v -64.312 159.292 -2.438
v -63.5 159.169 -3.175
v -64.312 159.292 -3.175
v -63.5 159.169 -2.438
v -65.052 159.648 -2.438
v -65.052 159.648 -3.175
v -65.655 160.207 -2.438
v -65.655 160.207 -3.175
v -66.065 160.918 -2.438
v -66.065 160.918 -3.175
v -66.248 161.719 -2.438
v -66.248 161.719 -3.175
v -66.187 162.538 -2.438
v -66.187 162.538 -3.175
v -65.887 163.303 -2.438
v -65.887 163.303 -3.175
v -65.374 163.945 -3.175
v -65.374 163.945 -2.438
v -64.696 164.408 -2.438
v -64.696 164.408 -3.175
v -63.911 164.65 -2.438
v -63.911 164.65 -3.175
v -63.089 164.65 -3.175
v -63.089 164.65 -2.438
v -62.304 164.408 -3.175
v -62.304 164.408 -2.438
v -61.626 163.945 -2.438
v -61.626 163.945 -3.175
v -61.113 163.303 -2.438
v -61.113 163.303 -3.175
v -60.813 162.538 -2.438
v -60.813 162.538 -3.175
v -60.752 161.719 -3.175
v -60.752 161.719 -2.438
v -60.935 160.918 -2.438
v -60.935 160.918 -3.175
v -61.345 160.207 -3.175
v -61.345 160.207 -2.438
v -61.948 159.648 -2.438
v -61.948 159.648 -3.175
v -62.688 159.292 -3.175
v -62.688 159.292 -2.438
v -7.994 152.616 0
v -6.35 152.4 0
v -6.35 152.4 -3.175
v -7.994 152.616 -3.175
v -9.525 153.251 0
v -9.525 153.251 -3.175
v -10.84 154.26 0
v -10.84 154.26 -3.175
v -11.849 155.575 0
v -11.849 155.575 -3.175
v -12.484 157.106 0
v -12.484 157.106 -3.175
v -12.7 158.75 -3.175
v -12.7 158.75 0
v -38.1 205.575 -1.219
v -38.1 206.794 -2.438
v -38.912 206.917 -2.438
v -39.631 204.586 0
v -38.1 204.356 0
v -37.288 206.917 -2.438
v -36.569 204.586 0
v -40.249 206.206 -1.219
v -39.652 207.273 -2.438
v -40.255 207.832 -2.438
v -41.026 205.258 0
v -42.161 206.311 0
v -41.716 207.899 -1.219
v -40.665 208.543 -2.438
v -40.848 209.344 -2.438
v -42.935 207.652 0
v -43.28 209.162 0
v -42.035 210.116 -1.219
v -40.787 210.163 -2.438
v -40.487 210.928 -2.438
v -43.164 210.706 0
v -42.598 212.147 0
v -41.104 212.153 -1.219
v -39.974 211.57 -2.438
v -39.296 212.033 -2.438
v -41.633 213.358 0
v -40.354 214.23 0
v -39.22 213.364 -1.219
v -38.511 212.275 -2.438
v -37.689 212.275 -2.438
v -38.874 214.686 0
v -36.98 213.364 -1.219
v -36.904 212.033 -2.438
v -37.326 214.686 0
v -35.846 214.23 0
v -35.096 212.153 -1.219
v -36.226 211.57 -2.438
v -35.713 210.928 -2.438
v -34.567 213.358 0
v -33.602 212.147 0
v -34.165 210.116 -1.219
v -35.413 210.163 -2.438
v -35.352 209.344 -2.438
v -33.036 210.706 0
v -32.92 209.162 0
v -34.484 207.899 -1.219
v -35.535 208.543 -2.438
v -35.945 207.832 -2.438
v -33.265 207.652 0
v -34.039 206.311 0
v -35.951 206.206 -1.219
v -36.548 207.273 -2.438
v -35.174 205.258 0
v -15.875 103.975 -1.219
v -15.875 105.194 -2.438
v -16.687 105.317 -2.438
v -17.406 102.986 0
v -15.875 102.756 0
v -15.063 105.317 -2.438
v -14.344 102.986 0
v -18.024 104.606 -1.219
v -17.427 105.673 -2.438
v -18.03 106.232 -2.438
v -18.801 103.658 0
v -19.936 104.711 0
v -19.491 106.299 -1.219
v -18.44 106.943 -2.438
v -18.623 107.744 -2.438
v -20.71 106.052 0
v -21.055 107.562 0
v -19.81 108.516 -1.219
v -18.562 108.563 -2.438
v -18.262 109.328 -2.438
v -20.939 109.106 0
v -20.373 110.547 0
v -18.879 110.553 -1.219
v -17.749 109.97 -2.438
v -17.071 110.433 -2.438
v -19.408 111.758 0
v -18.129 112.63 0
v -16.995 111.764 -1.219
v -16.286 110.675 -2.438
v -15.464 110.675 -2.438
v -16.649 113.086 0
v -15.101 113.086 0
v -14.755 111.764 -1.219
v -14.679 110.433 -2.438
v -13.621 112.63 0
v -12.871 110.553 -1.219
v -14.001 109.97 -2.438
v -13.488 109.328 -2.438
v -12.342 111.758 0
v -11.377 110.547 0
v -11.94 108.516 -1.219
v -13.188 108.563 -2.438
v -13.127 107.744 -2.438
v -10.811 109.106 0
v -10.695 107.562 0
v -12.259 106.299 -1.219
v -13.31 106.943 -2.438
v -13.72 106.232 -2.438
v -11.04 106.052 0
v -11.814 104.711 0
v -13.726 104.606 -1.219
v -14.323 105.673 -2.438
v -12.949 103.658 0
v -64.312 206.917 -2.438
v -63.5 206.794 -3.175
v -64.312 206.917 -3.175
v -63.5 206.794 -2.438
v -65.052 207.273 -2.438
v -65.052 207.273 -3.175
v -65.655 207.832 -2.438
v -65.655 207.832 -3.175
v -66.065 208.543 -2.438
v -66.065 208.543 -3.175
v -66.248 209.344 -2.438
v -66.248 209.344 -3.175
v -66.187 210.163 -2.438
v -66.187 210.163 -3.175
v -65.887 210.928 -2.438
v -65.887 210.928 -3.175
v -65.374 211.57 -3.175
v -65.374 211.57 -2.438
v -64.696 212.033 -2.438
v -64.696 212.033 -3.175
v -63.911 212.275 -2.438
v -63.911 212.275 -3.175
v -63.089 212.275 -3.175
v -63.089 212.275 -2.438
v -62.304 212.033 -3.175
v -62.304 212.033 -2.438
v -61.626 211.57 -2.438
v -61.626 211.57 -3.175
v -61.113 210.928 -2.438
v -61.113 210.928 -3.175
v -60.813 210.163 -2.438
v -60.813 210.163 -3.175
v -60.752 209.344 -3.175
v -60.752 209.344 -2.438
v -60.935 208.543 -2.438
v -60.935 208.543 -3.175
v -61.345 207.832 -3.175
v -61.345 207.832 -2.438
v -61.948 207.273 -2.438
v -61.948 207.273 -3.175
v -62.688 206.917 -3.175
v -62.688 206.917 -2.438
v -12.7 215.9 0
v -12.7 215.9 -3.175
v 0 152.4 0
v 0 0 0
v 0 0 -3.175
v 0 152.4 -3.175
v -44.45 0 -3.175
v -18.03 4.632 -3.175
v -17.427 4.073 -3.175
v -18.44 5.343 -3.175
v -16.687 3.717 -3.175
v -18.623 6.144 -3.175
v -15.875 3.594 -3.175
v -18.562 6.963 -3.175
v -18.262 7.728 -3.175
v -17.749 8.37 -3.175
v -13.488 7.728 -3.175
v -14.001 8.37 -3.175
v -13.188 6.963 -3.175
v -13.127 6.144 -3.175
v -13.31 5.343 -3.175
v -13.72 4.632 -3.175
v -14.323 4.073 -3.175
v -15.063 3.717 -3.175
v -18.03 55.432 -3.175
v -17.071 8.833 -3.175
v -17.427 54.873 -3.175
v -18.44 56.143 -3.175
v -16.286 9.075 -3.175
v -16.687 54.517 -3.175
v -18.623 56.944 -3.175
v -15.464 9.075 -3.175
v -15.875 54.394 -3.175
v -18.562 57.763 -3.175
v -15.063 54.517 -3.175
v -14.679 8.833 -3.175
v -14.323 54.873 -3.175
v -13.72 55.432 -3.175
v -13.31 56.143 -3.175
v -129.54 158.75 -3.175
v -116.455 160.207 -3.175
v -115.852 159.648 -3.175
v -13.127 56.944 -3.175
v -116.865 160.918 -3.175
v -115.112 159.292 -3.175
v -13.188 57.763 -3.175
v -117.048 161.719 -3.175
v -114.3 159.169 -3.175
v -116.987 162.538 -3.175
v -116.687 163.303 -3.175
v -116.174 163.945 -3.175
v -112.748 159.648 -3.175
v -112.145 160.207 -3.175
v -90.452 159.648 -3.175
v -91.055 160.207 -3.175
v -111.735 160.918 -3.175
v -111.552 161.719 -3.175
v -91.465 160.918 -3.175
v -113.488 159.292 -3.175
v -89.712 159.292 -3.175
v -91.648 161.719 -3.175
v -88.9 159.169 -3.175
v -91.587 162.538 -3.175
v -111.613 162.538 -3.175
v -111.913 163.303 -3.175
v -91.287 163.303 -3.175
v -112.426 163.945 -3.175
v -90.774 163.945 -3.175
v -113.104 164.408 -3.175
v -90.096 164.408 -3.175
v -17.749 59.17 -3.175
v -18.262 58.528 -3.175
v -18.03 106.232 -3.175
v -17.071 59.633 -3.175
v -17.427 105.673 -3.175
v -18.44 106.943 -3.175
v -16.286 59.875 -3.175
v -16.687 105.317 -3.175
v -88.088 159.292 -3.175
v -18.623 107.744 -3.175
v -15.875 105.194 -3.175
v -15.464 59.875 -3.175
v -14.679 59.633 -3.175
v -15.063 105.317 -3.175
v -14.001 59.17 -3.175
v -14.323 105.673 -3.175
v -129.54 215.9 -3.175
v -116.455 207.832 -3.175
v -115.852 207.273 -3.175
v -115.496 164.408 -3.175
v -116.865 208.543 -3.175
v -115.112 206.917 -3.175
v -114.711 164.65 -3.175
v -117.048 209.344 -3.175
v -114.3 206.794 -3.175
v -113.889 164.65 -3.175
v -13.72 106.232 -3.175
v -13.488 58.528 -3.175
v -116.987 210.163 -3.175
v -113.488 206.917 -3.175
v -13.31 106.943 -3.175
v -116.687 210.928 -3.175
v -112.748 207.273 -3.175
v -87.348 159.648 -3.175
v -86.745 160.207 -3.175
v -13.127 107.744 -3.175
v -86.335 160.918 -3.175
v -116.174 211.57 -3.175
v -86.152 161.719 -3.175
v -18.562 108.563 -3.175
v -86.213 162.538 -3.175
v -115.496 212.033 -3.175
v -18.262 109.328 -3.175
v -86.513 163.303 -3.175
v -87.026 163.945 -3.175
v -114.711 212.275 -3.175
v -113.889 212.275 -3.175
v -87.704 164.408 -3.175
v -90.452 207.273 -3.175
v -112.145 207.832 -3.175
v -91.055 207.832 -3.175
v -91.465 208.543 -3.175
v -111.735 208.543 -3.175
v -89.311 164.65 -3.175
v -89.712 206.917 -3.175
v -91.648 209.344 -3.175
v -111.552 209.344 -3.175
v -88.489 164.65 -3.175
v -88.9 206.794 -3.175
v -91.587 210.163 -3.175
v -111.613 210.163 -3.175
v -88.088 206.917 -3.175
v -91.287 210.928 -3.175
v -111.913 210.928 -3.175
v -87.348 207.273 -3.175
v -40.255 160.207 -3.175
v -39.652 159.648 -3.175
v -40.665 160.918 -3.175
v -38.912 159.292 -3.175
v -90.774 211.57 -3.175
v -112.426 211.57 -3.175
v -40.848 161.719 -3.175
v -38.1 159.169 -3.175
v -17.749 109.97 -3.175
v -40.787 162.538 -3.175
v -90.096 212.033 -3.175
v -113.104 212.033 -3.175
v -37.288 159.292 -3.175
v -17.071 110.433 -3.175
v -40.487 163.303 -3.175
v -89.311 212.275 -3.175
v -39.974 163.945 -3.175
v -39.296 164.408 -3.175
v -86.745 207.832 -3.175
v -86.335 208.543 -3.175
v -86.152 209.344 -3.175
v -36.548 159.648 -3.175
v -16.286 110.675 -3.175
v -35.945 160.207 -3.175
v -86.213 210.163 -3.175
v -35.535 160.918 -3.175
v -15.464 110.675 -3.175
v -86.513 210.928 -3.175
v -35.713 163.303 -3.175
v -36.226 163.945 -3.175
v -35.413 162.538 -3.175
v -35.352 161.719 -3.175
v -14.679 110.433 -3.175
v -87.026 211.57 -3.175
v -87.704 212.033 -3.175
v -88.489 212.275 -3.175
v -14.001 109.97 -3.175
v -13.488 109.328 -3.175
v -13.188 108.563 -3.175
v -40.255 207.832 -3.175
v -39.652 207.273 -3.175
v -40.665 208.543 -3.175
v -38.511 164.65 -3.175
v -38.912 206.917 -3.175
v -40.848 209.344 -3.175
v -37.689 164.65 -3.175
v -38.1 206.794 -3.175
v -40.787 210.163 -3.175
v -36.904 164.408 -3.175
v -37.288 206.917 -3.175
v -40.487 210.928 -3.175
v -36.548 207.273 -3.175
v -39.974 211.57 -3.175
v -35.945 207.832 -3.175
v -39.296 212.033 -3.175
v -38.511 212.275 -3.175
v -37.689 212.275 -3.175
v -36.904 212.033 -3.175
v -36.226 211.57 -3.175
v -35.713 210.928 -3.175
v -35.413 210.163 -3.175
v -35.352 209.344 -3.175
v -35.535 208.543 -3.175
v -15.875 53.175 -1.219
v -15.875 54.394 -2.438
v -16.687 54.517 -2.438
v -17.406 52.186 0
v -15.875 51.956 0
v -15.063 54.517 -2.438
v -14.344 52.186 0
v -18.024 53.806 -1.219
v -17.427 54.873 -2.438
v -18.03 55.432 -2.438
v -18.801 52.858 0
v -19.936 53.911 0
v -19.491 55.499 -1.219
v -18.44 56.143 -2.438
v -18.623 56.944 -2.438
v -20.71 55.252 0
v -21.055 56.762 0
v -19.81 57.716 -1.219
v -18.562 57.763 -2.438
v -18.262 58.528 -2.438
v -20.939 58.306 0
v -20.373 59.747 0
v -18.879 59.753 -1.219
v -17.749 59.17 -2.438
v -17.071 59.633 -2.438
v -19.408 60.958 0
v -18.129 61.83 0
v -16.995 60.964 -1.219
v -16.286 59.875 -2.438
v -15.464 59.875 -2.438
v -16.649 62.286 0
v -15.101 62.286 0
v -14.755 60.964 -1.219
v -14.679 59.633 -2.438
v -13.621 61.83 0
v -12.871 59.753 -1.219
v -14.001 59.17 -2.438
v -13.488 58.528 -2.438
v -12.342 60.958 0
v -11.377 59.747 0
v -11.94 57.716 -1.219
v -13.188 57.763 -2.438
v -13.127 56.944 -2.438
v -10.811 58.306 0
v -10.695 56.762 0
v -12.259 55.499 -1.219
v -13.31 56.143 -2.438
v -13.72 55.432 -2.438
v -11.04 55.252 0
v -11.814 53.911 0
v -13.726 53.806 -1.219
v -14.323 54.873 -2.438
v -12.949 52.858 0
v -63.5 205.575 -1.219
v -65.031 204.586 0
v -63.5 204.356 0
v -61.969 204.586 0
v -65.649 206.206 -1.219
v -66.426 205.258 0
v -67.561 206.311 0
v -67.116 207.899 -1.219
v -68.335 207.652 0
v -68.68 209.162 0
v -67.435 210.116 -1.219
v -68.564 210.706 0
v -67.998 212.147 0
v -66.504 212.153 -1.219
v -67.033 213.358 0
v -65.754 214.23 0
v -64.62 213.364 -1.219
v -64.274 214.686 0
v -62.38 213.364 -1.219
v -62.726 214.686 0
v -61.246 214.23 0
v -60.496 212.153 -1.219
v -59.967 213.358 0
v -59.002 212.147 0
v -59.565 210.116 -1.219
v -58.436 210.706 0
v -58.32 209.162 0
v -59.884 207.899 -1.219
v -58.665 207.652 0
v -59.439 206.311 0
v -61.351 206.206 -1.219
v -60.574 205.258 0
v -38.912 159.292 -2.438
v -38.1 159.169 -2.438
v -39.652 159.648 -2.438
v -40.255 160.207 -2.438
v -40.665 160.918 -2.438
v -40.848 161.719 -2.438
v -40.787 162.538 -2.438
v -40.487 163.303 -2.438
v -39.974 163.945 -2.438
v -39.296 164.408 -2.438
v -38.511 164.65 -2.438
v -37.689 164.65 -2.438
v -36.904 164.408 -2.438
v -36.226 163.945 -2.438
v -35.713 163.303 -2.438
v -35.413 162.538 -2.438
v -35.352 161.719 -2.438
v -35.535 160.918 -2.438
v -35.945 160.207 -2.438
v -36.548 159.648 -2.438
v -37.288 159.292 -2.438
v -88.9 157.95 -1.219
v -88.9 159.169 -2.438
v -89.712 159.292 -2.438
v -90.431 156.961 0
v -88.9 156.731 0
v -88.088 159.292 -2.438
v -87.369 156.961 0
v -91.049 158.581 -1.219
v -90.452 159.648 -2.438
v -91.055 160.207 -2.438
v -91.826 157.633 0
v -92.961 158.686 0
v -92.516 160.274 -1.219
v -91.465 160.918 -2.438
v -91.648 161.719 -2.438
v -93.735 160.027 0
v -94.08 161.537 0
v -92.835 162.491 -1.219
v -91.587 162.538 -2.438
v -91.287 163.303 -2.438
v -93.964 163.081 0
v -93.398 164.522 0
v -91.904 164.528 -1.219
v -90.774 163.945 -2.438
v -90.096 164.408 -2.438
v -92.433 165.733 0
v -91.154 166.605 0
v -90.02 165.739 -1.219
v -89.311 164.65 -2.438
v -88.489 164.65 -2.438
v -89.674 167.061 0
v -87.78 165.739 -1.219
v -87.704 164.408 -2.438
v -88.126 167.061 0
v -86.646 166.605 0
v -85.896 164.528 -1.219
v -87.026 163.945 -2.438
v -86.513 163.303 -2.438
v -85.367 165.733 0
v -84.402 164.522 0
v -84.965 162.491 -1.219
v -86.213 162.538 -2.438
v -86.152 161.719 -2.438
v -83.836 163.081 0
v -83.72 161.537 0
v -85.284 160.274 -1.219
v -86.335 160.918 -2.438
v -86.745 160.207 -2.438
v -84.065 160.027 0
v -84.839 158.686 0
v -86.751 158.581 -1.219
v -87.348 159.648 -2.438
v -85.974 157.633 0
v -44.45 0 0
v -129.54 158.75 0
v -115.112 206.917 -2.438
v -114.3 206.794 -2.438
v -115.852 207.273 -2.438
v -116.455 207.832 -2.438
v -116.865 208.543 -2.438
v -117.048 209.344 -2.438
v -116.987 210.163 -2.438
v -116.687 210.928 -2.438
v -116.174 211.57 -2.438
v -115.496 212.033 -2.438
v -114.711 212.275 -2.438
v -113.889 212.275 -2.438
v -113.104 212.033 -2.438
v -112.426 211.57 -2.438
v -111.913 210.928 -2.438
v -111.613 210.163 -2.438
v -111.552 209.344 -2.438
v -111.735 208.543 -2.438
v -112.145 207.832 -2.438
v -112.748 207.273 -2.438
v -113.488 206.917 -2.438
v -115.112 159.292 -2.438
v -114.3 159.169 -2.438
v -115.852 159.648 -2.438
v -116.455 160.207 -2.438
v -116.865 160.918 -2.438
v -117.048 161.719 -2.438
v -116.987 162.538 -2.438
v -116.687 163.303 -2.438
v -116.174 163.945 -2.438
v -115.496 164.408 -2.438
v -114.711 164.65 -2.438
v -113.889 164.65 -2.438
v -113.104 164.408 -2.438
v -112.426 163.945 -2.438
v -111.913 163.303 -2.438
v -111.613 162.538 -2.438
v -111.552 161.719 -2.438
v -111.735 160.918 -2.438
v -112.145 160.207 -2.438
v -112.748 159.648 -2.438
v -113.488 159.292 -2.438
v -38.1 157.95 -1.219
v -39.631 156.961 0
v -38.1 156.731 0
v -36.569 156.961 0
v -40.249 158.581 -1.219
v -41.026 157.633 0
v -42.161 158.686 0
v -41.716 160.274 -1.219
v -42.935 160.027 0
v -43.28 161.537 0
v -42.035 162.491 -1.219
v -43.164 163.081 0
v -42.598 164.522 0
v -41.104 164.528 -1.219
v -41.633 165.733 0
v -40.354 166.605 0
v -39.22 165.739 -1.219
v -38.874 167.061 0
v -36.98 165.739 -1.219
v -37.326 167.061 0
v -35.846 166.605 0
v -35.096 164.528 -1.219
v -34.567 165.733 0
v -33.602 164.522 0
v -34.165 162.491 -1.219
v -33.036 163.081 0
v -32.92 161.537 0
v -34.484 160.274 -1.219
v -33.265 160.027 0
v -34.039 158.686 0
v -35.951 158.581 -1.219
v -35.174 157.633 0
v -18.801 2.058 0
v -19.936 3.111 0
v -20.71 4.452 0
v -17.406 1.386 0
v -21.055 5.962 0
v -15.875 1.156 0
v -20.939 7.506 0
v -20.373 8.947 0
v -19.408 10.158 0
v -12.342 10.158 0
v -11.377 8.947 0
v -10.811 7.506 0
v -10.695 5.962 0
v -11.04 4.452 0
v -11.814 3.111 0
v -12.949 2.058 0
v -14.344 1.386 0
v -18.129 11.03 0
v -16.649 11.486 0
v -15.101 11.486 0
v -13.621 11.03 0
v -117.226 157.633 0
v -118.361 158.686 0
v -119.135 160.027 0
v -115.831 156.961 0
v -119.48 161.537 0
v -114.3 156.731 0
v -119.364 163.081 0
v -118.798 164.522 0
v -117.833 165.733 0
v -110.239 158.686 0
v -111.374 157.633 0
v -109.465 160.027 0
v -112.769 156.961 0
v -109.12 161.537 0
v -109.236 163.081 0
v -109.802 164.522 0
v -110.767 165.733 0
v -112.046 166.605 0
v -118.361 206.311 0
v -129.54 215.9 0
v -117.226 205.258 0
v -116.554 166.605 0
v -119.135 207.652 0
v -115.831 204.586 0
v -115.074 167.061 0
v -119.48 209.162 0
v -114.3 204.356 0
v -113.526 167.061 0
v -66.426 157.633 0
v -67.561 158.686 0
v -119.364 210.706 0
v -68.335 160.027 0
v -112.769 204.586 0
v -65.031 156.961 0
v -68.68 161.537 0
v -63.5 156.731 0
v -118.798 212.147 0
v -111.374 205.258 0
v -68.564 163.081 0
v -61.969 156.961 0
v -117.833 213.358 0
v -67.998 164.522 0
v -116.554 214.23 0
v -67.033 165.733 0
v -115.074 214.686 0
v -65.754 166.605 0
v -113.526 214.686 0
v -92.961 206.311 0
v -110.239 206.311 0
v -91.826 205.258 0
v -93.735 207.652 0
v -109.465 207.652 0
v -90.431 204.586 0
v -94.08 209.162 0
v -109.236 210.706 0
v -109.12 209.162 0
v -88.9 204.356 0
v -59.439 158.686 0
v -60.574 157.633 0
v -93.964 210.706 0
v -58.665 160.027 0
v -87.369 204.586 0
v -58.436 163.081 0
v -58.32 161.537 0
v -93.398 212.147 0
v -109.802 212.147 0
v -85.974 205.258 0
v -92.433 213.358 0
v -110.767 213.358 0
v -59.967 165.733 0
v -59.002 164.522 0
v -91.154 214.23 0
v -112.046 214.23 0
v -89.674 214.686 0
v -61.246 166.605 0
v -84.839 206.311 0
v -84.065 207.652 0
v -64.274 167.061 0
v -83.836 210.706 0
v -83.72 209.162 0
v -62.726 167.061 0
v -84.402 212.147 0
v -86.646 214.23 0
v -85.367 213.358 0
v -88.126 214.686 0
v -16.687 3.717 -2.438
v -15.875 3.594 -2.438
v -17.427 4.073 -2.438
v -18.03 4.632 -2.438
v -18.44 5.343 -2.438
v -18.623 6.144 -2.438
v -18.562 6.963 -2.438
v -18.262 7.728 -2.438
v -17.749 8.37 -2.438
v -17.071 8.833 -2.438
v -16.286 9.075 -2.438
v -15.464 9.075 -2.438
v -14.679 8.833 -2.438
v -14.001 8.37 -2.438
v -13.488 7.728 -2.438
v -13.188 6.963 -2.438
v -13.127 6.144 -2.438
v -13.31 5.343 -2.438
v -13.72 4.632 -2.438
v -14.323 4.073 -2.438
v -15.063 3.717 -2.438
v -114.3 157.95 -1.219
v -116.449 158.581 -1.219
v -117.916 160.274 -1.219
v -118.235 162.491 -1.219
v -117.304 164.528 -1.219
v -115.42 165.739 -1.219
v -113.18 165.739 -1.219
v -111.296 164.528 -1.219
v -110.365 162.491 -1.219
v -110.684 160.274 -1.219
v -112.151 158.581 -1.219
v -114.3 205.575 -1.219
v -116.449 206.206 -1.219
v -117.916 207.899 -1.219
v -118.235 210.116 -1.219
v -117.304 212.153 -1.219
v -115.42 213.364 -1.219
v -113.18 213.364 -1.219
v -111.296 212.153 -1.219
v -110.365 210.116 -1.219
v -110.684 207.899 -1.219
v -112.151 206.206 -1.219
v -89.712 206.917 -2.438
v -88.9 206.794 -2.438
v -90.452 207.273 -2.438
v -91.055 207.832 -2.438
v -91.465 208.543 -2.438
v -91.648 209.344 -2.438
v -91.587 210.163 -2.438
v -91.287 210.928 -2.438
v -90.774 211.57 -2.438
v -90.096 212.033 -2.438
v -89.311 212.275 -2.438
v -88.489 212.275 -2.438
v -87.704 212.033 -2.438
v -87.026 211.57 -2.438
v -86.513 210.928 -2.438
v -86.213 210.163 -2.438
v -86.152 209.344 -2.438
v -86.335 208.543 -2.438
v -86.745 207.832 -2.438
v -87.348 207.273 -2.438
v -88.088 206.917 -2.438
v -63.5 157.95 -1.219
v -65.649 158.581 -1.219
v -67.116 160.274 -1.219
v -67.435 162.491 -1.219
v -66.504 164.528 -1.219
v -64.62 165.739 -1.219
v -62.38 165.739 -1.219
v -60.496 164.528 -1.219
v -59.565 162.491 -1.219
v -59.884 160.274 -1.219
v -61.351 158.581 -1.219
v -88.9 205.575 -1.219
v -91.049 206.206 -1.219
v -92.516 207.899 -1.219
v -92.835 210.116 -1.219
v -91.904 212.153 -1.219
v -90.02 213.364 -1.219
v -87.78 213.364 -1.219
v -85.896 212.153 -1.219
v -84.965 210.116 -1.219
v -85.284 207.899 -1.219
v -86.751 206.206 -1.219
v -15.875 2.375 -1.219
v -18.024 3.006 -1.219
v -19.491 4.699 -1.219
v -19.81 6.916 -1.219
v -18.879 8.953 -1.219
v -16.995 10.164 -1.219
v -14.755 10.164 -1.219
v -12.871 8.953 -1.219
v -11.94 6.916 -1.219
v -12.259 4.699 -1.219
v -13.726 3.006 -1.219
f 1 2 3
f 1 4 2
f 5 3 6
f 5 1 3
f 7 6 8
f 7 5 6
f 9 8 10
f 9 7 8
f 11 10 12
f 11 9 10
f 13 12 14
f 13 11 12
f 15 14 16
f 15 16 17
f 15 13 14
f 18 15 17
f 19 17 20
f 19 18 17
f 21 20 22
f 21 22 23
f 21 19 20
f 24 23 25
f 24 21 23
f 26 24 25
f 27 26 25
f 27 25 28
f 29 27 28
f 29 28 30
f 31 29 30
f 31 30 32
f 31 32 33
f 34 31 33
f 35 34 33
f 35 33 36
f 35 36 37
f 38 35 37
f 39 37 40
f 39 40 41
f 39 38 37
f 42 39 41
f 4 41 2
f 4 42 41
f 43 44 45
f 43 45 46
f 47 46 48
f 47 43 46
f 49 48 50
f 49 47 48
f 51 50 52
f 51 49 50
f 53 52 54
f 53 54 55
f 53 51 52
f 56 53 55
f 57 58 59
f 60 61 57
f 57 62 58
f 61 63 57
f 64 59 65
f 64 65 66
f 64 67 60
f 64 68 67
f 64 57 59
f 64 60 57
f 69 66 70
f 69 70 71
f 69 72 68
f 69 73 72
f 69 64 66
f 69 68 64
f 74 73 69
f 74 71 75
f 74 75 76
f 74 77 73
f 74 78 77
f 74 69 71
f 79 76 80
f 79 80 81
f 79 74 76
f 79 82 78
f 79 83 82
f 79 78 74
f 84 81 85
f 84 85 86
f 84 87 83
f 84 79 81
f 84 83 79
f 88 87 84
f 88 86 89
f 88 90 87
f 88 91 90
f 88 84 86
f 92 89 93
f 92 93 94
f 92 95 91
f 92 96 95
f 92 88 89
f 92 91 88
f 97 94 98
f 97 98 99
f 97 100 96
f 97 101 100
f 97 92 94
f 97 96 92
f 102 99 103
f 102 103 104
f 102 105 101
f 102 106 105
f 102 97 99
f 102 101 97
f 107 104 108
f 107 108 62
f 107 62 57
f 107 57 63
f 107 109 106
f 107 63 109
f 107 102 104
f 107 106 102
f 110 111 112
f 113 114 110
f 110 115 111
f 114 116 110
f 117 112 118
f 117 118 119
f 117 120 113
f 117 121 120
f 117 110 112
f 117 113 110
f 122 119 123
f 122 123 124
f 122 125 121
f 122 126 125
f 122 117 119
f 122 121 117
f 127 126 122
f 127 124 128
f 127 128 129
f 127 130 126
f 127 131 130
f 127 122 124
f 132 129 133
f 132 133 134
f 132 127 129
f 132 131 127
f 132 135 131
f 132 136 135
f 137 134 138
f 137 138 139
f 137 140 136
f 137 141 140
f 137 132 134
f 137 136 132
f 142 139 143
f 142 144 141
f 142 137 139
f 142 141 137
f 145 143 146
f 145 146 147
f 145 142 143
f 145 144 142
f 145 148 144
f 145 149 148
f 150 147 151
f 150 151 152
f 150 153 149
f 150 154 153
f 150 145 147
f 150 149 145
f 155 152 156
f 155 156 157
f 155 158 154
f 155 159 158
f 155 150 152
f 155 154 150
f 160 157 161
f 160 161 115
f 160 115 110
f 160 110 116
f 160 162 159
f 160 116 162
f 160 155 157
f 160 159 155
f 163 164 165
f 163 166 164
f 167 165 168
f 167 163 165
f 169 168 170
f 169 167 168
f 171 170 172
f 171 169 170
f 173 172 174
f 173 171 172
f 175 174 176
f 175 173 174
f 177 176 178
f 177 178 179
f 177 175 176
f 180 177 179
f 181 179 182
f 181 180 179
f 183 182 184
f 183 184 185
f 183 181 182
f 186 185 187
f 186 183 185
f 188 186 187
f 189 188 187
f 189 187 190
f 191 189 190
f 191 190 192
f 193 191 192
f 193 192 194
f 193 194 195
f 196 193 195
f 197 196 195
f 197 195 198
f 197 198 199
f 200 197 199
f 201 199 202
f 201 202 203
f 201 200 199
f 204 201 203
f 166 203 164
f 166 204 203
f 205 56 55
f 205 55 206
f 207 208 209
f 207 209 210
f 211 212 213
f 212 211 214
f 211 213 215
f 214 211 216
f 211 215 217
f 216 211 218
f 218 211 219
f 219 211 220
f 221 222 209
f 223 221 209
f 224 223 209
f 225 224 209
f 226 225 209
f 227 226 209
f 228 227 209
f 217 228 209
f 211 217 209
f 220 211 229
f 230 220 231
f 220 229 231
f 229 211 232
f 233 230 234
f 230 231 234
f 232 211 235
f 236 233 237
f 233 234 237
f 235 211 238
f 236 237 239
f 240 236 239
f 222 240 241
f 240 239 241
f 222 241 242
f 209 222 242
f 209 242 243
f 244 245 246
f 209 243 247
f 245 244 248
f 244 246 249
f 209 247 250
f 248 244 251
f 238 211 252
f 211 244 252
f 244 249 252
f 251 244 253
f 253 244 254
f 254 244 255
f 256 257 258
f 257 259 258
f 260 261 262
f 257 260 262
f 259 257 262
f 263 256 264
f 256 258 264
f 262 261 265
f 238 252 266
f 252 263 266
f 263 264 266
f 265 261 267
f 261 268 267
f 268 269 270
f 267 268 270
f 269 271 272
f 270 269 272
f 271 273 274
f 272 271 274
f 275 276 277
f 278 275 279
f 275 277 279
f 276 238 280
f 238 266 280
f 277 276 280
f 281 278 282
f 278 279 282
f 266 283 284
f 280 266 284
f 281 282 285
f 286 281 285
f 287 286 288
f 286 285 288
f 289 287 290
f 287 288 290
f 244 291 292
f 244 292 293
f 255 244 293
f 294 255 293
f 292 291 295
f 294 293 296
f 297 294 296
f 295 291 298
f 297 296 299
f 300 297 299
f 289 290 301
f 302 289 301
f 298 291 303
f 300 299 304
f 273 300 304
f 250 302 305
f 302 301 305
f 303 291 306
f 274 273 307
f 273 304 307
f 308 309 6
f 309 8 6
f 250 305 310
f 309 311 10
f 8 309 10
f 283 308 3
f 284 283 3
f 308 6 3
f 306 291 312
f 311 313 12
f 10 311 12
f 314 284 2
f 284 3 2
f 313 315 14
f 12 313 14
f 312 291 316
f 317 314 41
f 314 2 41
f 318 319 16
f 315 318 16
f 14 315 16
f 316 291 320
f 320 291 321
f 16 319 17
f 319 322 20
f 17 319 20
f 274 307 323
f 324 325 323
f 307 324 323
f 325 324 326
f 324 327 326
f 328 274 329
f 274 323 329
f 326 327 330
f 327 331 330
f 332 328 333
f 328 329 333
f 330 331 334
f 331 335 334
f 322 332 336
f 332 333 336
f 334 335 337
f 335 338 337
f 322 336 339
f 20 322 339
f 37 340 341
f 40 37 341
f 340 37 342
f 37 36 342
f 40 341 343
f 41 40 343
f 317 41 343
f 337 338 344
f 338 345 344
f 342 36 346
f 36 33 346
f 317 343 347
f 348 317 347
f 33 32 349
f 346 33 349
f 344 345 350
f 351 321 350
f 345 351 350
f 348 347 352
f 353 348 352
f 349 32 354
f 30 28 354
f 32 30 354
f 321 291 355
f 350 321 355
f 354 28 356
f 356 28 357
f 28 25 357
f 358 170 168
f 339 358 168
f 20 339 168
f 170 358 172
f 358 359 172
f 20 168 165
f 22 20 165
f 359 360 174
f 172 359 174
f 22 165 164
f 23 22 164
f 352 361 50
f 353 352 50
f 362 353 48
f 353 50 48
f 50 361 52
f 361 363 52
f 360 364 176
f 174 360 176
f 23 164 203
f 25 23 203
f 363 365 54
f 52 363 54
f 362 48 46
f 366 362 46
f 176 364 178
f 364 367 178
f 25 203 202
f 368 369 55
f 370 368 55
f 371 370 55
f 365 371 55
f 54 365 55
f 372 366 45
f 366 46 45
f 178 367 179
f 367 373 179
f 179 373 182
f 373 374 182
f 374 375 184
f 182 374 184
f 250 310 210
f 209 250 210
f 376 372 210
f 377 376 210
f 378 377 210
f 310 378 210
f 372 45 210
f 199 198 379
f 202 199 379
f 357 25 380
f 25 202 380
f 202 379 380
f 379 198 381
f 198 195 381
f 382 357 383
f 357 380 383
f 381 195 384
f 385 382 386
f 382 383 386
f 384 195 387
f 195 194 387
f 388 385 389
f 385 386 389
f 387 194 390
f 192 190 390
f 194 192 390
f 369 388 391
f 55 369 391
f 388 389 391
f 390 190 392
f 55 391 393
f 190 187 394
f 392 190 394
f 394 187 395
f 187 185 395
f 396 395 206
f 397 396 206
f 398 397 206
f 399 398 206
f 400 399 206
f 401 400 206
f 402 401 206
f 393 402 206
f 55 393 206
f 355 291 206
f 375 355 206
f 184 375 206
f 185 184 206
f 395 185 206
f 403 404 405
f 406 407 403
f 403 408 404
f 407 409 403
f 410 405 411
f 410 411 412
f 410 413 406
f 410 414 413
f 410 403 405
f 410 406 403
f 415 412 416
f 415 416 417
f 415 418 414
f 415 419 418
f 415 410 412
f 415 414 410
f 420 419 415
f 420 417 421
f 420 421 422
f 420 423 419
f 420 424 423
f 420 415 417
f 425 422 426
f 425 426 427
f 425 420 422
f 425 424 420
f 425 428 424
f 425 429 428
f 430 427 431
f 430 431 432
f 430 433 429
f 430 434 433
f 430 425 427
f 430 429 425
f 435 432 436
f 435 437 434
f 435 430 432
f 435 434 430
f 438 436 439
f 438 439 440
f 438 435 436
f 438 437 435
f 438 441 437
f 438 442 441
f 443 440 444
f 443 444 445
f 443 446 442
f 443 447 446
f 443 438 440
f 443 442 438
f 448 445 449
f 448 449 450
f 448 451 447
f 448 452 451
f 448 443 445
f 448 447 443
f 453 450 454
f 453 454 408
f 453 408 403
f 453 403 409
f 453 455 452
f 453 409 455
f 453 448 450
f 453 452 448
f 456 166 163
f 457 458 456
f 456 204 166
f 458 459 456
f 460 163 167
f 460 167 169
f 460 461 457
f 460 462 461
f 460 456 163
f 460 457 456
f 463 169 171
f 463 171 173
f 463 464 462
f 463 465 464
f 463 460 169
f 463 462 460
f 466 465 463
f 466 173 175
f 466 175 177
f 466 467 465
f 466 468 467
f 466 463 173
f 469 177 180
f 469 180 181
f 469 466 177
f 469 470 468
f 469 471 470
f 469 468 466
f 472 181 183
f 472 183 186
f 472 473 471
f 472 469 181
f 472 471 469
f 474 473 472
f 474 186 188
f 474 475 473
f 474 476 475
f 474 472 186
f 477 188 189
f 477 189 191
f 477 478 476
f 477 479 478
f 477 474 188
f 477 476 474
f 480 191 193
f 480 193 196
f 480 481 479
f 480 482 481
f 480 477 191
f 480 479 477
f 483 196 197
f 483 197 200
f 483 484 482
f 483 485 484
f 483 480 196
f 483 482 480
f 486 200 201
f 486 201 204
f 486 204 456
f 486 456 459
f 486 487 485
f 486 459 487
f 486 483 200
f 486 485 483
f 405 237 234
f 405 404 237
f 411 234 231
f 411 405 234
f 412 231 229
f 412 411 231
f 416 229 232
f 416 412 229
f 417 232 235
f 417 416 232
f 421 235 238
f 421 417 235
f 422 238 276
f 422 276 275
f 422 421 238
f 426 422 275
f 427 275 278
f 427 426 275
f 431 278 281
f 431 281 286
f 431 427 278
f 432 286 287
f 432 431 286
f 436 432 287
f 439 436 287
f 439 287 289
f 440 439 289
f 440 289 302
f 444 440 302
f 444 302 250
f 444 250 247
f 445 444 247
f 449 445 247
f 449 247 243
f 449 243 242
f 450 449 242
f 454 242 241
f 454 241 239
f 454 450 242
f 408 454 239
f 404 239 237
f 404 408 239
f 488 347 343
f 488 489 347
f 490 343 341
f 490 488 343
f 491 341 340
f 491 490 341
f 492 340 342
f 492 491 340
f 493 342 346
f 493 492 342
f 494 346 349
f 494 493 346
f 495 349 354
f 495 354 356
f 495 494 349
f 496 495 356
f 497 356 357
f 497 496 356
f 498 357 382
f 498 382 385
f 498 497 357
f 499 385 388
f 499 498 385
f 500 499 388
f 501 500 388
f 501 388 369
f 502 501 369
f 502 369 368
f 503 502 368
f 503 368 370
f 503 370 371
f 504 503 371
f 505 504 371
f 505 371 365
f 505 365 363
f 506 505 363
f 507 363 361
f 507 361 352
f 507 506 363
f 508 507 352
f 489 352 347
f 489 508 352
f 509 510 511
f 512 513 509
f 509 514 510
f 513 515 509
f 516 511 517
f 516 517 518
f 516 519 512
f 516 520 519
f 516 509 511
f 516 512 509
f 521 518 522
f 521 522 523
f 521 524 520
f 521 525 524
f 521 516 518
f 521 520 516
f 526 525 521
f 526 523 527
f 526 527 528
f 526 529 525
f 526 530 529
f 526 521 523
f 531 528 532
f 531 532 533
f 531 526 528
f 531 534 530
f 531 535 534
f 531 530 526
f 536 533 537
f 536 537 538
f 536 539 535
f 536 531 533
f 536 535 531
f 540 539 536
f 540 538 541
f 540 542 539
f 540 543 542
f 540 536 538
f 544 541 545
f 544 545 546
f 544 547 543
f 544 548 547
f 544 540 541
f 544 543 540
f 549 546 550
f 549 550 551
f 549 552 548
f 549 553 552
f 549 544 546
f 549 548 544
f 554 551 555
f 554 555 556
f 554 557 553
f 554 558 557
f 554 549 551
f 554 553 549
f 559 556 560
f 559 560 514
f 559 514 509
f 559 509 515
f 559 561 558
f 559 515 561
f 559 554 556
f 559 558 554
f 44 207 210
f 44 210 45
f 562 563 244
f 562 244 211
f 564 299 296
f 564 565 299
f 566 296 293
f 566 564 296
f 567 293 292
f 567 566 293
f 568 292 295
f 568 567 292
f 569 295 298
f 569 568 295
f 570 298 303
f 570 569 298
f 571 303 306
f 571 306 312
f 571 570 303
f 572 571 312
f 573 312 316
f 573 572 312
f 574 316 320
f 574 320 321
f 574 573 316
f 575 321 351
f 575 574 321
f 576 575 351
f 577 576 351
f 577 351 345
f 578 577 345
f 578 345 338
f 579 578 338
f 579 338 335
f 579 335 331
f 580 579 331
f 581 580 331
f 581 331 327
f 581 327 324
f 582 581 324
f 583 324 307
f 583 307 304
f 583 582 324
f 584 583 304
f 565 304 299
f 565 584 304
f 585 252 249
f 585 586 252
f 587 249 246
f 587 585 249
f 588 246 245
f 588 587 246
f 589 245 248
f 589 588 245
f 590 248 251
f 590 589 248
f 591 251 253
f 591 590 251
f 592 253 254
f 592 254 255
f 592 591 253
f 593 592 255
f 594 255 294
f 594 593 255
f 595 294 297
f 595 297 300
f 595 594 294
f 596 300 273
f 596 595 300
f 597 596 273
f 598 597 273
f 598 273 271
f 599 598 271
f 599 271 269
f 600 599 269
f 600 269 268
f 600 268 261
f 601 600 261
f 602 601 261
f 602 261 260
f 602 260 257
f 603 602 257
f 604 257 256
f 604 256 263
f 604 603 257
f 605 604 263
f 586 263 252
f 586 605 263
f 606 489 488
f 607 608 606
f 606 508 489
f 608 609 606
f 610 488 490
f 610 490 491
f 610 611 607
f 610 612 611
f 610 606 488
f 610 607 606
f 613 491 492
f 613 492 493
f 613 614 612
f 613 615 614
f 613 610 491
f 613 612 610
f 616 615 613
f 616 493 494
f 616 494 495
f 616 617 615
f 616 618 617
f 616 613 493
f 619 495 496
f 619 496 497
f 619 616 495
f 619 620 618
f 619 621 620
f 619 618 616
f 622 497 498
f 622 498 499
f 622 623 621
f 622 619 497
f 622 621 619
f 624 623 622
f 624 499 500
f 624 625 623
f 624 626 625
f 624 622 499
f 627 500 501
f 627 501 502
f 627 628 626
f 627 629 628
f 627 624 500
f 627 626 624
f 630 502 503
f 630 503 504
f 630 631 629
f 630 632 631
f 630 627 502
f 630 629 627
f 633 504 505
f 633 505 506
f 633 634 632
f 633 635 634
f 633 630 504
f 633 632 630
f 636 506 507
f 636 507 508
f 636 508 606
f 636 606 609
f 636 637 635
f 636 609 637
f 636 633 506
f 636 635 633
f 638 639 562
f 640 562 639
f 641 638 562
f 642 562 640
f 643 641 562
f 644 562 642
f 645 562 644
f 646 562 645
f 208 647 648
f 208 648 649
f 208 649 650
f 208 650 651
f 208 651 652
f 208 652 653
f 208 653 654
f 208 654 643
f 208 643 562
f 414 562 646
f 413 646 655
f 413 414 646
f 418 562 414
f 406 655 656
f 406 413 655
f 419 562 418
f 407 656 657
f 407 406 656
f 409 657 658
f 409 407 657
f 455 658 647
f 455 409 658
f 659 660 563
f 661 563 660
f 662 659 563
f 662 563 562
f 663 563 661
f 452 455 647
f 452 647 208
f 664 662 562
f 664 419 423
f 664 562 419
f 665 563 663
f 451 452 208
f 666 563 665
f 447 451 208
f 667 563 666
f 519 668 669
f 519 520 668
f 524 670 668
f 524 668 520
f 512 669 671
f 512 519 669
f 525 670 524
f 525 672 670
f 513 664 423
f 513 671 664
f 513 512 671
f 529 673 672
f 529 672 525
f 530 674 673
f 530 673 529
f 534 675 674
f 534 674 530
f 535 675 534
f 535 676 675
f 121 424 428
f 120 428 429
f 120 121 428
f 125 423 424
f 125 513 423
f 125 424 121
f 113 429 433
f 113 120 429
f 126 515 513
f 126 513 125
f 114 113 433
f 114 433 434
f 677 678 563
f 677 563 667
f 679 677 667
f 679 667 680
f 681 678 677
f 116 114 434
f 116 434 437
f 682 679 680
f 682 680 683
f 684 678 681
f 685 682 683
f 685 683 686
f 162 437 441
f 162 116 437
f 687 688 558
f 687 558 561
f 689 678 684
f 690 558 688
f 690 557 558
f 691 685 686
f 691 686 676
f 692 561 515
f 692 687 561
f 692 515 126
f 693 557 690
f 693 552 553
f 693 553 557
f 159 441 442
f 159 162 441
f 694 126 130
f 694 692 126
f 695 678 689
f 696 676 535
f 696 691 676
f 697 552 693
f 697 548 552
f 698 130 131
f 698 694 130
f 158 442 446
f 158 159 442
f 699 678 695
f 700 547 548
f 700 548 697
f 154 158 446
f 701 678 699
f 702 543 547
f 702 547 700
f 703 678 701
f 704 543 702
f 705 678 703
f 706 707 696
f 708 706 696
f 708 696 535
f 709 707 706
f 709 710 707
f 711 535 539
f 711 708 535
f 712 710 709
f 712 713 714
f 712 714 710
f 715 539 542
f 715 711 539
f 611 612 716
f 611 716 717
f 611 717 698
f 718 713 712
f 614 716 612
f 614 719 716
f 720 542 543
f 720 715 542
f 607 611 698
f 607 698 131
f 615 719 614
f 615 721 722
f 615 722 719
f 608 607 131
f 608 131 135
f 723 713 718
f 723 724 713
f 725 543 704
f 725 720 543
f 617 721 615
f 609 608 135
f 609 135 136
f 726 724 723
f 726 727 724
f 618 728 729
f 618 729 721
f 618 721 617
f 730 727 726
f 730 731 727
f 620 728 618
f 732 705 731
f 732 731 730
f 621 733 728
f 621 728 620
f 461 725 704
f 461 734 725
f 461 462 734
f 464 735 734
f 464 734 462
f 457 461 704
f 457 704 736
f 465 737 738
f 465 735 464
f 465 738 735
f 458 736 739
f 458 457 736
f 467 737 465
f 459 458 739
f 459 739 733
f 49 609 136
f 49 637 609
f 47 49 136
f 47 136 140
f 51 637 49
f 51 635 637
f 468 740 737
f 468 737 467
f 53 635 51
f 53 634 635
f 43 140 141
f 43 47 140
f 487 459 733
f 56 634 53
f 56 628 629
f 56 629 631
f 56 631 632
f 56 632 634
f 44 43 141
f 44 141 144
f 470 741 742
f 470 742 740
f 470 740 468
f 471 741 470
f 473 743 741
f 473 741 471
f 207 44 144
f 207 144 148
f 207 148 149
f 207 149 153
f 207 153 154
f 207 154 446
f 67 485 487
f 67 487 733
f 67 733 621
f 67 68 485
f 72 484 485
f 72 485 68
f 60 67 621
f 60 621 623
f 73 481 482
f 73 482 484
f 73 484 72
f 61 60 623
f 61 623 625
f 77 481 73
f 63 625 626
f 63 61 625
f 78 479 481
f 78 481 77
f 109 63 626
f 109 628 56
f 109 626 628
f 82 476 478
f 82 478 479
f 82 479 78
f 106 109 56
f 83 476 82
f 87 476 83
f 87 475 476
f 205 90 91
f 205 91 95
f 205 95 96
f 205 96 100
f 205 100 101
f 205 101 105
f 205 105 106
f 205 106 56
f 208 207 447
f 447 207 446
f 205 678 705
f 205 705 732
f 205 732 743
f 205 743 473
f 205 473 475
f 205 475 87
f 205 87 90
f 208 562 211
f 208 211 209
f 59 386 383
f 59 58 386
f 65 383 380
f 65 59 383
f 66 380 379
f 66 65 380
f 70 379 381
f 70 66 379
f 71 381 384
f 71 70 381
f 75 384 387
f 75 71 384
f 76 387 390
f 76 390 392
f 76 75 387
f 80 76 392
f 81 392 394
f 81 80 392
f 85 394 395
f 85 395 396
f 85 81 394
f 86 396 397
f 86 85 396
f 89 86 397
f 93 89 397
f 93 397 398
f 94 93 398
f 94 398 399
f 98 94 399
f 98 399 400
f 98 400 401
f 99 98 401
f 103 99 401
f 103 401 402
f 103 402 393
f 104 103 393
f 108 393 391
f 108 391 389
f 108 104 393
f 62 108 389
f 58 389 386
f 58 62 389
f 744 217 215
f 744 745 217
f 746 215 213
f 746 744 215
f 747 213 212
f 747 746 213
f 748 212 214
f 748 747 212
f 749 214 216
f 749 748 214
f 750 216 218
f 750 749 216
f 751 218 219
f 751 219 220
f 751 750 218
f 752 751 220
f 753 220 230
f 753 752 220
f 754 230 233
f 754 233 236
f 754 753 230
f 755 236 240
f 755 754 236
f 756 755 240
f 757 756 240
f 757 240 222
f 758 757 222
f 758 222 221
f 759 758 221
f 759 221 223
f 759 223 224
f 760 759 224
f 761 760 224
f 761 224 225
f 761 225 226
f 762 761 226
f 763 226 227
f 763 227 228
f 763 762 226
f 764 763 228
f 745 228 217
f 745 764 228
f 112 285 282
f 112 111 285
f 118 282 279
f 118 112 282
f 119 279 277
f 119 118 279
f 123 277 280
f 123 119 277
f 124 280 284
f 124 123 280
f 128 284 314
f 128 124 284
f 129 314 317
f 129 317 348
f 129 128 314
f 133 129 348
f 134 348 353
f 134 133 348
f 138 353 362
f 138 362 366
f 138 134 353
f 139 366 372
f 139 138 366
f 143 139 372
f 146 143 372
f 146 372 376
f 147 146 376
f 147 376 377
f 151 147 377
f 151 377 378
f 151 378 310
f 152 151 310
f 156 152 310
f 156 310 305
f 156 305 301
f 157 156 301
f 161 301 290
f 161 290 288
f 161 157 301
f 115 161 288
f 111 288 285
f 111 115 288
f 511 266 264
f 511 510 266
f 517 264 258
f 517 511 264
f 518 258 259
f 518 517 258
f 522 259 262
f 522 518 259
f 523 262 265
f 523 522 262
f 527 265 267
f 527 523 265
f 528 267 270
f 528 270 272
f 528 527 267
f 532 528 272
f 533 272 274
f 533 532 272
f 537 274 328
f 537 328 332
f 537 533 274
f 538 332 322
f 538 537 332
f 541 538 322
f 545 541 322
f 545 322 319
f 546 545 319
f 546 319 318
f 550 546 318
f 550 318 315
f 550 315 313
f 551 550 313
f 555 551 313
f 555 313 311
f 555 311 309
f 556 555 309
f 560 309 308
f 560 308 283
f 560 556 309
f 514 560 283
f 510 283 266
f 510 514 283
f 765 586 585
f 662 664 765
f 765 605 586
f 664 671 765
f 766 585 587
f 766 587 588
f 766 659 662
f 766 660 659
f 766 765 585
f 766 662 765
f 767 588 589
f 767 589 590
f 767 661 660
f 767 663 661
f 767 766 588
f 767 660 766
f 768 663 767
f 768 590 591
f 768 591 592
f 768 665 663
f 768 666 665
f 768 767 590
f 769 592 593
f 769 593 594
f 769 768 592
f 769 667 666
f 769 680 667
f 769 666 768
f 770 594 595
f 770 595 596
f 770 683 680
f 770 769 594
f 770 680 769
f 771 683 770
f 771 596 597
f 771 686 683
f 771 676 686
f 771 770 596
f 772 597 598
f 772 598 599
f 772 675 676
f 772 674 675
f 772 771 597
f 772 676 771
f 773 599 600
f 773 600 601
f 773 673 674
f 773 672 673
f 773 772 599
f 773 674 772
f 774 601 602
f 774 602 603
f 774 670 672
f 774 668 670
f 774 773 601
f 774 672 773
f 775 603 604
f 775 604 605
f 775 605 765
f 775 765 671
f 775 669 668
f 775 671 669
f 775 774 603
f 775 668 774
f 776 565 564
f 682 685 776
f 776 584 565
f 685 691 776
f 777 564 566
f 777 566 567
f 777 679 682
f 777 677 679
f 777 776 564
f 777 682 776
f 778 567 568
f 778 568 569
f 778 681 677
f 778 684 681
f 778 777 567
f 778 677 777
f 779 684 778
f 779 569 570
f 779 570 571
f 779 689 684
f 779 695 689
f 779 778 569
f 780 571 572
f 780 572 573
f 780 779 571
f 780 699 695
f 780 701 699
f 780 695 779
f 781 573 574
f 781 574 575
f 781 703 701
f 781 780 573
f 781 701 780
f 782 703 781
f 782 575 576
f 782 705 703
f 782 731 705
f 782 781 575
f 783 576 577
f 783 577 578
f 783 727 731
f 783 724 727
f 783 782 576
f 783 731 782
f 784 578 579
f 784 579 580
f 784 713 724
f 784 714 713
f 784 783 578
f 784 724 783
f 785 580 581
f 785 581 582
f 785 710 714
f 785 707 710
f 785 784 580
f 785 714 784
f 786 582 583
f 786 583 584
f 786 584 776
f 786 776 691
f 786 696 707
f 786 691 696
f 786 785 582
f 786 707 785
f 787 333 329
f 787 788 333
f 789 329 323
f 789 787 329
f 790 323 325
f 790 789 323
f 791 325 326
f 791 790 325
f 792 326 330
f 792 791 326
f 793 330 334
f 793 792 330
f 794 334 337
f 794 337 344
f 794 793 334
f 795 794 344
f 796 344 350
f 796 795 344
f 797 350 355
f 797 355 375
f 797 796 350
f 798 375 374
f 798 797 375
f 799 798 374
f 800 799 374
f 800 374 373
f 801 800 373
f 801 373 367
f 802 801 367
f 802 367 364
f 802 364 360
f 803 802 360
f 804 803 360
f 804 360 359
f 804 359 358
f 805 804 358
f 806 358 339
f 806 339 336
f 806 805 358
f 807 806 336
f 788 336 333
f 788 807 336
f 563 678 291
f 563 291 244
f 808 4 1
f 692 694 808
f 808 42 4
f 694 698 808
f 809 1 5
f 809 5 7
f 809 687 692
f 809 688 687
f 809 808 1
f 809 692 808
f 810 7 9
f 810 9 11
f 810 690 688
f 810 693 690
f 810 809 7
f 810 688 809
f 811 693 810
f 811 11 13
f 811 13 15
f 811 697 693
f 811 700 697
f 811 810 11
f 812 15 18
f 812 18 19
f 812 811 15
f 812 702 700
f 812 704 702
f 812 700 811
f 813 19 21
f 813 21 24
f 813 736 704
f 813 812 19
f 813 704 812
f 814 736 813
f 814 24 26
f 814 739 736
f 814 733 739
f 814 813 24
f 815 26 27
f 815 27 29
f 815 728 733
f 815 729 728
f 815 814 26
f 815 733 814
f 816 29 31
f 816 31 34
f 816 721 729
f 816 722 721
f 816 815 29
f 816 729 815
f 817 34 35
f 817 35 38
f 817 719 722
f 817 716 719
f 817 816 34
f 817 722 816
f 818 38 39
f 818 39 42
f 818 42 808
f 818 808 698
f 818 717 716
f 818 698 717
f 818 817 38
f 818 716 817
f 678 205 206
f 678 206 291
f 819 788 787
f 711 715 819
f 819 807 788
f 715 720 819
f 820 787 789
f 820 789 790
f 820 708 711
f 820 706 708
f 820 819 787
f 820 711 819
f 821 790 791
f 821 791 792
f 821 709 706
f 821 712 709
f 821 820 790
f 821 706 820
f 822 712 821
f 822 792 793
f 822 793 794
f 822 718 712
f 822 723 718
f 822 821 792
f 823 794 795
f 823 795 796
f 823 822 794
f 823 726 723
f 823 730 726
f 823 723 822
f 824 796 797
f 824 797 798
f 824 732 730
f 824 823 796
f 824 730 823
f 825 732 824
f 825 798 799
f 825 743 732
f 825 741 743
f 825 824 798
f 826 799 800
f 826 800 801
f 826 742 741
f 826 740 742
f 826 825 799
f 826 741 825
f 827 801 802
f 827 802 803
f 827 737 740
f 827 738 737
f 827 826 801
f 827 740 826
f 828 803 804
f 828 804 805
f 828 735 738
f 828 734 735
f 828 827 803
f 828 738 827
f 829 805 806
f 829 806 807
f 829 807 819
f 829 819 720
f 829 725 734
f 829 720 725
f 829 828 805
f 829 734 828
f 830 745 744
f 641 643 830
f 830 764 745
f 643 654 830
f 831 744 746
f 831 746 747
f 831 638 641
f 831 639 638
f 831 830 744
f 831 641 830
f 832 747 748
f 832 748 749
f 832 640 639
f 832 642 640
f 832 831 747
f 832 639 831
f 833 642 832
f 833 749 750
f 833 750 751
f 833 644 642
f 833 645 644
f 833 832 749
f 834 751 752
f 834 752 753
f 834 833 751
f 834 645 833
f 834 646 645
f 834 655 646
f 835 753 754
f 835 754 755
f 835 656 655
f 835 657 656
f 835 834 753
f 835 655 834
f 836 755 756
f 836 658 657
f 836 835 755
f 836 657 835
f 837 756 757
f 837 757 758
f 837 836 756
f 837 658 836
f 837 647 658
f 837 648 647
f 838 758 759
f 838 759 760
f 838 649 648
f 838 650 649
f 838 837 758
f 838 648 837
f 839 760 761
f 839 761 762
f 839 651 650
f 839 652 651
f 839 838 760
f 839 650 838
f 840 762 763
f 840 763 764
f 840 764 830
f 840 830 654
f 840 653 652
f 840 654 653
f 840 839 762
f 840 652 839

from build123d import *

# Parameters (mm, degrees)
BOSS_EXTRUDE1_DEPTH                       = 3.175
CSK_FOR_0_FLAT_HEAD_MACHINE_SCREW_2_COUNT = 2
CSK_FOR_0_FLAT_HEAD_MACHINE_SCREW_2_PITCH = 47.625
LPATTERN1_COUNT                           = 4
LPATTERN1_PITCH                           = 25.4
LPATTERN2_COUNT                           = 3
LPATTERN2_PITCH                           = 50.8


with BuildPart() as part:
    # Sketch1 → Boss-Extrude1 (new body)
    with BuildSketch(Plane.XY):
        with BuildLine():
            Line((0, 0), (0, 152.4))
            Line((0, 152.4), (-6.35, 152.4))
            ThreePointArc((-6.35, 152.4), (-10.840128061, 154.259871939), (-12.7, 158.75))
            Line((-12.7, 158.75), (-12.7, 215.9))
            Line((-12.7, 215.9), (-129.54, 215.9))
            Line((-129.54, 215.9), (-129.54, 158.75))
            Line((-129.54, 158.75), (-44.45, 0))
            Line((-44.45, 0), (0, 0))
        make_face()
    extrude(amount=-BOSS_EXTRUDE1_DEPTH)

    # Sketch3 → CSK for _0 Flat Head Machine Screw _100 (revolve, cut)
    with BuildSketch(Plane(origin=(-114.3, 209.55, 0), x_dir=(0, -1, 0), z_dir=(1, 0, 0))):
        Polygon((0, 0), (0, 3.175), (2.7559, 3.175), (2.7559, 2.4384), (5.1943, 0), align=None)
    csk_for_0_flat_head_machine_screw_100 = revolve(axis=Axis((-114.3, 209.55, 6.35), (0, 0, -1)), mode=Mode.SUBTRACT)

    # CSK for _0 Flat Head Machine Screw _ 2: CSK for _0 Flat Head Machine Screw _100 ×2
    with Locations(*[(0, -i * CSK_FOR_0_FLAT_HEAD_MACHINE_SCREW_2_PITCH, 0) for i in range(1, CSK_FOR_0_FLAT_HEAD_MACHINE_SCREW_2_COUNT)]):
        add(csk_for_0_flat_head_machine_screw_100, mode=Mode.SUBTRACT)

    # LPattern1: CSK for _0 Flat Head Machine Screw _100 ×4
    with Locations(*[(i * LPATTERN1_PITCH, 0, 0) for i in range(1, LPATTERN1_COUNT)]):
        add(csk_for_0_flat_head_machine_screw_100, mode=Mode.SUBTRACT)

    # LPattern1 copy 1 sketch → LPattern1 copy 1 (revolve, cut)
    with BuildSketch(Plane(origin=(-88.9, 161.925, 0), x_dir=(0, -1, 0), z_dir=(1, 0, 0))):
        Polygon((0, 0), (0, 3.175), (2.7559, 3.175), (2.7559, 2.4384), (5.1943, 0), align=None)
    revolve(axis=Axis((-88.9, 161.925, 6.35), (0, 0, -1)), mode=Mode.SUBTRACT)

    # LPattern1 copy 2 sketch → LPattern1 copy 2 (revolve, cut)
    with BuildSketch(Plane(origin=(-63.5, 161.925, 0), x_dir=(0, -1, 0), z_dir=(1, 0, 0))):
        Polygon((0, 0), (0, 3.175), (2.7559, 3.175), (2.7559, 2.4384), (5.1943, 0), align=None)
    revolve(axis=Axis((-63.5, 161.925, 6.35), (0, 0, -1)), mode=Mode.SUBTRACT)

    # LPattern1 copy 3 sketch → LPattern1 copy 3 (revolve, cut)
    with BuildSketch(Plane(origin=(-38.1, 161.925, 0), x_dir=(0, -1, 0), z_dir=(1, 0, 0))):
        Polygon((0, 0), (0, 3.175), (2.7559, 3.175), (2.7559, 2.4384), (5.1943, 0), align=None)
    revolve(axis=Axis((-38.1, 161.925, 6.35), (0, 0, -1)), mode=Mode.SUBTRACT)

    # Sketch4 → CSK for _0 Flat Head Machine Screw _ 3 (revolve, cut)
    with BuildSketch(Plane(origin=(-15.875, 107.95, 0), x_dir=(0, -1, 0), z_dir=(1, 0, 0))):
        Polygon((0, 0), (0, 3.175), (2.7559, 3.175), (2.7559, 2.4384), (5.1943, 0), align=None)
    csk_for_0_flat_head_machine_screw_3 = revolve(axis=Axis((-15.875, 107.95, 6.35), (0, 0, -1)), mode=Mode.SUBTRACT)

    # LPattern2: CSK for _0 Flat Head Machine Screw _ 3 ×3
    with Locations(*[(0, -i * LPATTERN2_PITCH, 0) for i in range(1, LPATTERN2_COUNT)]):
        add(csk_for_0_flat_head_machine_screw_3, mode=Mode.SUBTRACT)


solid = part.part
